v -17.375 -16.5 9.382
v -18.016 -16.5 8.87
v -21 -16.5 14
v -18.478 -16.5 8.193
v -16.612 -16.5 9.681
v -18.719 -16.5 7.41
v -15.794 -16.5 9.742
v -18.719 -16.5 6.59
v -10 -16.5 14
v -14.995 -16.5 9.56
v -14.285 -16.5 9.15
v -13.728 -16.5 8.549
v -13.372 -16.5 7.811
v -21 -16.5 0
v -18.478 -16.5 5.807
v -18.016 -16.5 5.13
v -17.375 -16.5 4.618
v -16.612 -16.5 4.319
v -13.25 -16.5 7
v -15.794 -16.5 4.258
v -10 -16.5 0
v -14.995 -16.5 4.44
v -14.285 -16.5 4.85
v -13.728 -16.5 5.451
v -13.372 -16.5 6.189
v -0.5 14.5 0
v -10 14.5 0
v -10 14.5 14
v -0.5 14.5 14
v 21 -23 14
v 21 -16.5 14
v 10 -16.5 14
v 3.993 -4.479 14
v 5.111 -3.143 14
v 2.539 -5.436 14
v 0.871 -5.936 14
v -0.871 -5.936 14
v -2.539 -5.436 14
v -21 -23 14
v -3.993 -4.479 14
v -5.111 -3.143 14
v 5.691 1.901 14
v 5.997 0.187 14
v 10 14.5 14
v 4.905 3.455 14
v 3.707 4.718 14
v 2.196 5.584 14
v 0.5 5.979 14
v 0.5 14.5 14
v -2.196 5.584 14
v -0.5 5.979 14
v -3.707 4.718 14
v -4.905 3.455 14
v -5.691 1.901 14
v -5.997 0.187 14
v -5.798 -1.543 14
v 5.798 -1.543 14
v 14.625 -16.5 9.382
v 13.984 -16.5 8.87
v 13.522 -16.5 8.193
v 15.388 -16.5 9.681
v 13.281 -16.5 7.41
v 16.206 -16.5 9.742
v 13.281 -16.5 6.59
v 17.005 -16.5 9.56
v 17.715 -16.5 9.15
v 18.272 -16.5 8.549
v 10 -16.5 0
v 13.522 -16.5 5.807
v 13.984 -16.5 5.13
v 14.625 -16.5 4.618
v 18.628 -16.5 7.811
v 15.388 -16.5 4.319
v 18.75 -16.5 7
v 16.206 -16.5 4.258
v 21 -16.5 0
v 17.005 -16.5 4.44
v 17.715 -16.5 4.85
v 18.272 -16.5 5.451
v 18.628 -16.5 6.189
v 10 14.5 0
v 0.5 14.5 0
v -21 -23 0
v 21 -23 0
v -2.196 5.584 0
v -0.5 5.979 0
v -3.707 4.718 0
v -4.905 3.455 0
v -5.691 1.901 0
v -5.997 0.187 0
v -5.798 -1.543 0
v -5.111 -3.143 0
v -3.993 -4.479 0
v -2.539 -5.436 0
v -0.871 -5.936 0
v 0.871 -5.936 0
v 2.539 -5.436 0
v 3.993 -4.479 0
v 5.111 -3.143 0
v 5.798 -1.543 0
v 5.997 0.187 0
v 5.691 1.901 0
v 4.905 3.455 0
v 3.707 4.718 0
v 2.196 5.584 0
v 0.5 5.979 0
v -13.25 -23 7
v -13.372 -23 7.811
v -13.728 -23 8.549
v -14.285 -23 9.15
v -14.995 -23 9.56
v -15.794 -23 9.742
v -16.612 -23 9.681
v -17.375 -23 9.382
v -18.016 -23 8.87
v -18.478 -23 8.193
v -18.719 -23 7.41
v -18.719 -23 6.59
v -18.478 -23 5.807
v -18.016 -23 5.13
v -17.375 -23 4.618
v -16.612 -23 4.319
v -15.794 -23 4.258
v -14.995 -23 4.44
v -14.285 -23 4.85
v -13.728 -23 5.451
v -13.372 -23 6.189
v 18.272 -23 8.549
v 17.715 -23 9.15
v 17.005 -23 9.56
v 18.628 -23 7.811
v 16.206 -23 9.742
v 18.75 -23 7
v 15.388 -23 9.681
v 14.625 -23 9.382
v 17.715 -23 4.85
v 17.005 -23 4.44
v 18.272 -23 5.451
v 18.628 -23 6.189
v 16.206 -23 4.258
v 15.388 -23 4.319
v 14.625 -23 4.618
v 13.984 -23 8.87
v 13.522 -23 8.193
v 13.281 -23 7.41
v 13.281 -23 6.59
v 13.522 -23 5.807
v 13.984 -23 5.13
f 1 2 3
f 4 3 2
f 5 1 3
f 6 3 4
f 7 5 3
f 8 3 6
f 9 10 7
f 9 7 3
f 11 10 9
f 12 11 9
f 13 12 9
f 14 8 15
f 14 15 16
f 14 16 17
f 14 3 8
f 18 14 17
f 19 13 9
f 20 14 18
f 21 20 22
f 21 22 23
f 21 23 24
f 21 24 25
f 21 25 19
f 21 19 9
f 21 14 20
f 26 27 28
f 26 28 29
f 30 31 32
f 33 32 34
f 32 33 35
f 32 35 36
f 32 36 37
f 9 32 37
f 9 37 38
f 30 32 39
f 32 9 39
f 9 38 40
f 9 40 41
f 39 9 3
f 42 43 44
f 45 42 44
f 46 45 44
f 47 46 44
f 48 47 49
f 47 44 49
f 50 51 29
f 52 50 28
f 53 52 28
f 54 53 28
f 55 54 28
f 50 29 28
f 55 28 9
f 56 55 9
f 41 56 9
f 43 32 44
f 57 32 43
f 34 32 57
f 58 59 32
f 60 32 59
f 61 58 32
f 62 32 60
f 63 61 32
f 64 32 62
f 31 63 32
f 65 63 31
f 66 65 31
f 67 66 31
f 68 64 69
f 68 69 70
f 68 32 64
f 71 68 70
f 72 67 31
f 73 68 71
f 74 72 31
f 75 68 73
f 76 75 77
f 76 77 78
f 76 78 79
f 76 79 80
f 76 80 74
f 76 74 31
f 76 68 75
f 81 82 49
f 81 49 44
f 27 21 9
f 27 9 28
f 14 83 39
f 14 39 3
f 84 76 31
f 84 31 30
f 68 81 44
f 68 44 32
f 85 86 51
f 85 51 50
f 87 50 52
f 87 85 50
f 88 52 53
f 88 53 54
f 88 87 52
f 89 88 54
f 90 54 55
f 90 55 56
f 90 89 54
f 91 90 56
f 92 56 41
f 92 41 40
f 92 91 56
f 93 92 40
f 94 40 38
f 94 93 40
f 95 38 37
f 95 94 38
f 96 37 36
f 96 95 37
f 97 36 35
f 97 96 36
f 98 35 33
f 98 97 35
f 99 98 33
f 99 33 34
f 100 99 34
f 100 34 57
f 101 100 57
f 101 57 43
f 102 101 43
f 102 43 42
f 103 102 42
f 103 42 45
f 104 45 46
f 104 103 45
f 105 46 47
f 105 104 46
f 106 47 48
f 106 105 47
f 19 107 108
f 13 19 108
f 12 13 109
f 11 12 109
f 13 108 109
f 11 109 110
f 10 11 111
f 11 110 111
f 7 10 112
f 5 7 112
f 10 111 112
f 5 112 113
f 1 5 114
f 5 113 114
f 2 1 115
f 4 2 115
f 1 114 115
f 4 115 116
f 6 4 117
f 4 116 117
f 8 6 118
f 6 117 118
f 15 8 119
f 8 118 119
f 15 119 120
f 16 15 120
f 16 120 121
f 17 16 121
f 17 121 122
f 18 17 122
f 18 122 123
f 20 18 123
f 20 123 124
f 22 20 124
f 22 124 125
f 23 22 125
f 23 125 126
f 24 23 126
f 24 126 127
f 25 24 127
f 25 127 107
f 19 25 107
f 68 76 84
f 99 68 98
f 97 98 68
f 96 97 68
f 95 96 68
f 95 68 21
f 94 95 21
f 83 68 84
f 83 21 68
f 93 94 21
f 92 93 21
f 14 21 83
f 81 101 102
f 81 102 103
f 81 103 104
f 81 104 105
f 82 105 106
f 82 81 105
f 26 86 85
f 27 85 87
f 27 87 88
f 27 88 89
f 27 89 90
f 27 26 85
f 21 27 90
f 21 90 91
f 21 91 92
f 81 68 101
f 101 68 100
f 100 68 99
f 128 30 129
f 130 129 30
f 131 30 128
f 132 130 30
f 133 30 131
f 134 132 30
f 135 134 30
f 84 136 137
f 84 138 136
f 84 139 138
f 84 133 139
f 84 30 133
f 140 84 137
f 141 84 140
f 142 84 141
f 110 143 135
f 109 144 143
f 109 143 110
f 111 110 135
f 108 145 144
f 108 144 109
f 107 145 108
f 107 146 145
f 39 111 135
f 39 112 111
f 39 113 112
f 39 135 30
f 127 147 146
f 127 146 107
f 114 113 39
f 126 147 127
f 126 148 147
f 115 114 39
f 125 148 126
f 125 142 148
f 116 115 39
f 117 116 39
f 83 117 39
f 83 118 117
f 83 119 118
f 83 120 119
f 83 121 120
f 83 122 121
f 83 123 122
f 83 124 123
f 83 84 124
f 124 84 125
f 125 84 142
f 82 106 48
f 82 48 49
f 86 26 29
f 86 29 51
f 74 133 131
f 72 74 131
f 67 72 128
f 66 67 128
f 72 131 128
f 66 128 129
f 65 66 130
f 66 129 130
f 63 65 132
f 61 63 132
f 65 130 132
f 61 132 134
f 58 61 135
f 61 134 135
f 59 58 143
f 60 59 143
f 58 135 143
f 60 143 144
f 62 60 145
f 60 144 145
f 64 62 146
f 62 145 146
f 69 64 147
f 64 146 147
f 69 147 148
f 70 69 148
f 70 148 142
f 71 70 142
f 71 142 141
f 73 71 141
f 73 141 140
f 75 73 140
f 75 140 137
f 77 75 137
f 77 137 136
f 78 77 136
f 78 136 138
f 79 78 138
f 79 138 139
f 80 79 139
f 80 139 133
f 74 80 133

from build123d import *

# Parameters (mm, degrees)
Y_KSEKLIK_EKSTR_ZYON2_DEPTH       = 14
KES_EKSTR_ZYON1_REACH             = 39.5
IZIM2_R                           = 2.75
KES_EKSTR_ZYON1_DIRECTION_2_DEPTH = 1


with BuildPart() as part:
    # Çizim1 → Yükseklik-Ekstrüzyon2 (new body)
    with BuildSketch(Plane.XY):
        with BuildLine():
            Line((21, -23), (-21, -23))
            Line((-21, -23), (-21, -16.5))
            Line((-21, -16.5), (-10, -16.5))
            Line((-10, -16.5), (-10, 14.5))
            Line((-10, 14.5), (-0.5, 14.5))
            Line((-0.5, 14.5), (-0.5, 5.979130372))
            ThreePointArc((-0.5, 5.979130372), (0, -6), (0.5, 5.979130372))
            Line((0.5, 5.979130372), (0.5, 14.5))
            Line((0.5, 14.5), (10, 14.5))
            Line((10, 14.5), (10, -16.5))
            Line((10, -16.5), (21, -16.5))
            Line((21, -16.5), (21, -23))
        make_face()
    extrude(amount=Y_KSEKLIK_EKSTR_ZYON2_DEPTH)

    # Çizim2 → Kes-Ekstrüzyon1 (cut, up to next)
    with BuildSketch(Plane.XZ.offset(23), mode=Mode.PRIVATE) as kes_ekstr_zyon1_sk1:
        with Locations((-16, 7)):
            Circle(IZIM2_R)
    kes_ekstr_zyon1_tool1 = extrude(kes_ekstr_zyon1_sk1.sketch, amount=-KES_EKSTR_ZYON1_REACH, mode=Mode.PRIVATE) & part.part
    add(kes_ekstr_zyon1_tool1.solids().sort_by_distance((-16, -23, 7))[0], mode=Mode.SUBTRACT)
    # Çizim2 → Kes-Ekstrüzyon1 (cut, up to next)
    with BuildSketch(Plane.XZ.offset(23), mode=Mode.PRIVATE) as kes_ekstr_zyon1_sk2:
        with Locations((16, 7)):
            Circle(IZIM2_R)
    kes_ekstr_zyon1_tool2 = extrude(kes_ekstr_zyon1_sk2.sketch, amount=-KES_EKSTR_ZYON1_REACH, mode=Mode.PRIVATE) & part.part
    add(kes_ekstr_zyon1_tool2.solids().sort_by_distance((16, -23, 7))[0], mode=Mode.SUBTRACT)

    # Çizim2 → Kes-Ekstrüzyon1 direction 2 (cut)
    with BuildSketch(Plane.XZ.offset(23)):
        with Locations((-16, 7)):
            Circle(IZIM2_R)
        with Locations((16, 7)):
            Circle(IZIM2_R)
    extrude(amount=KES_EKSTR_ZYON1_DIRECTION_2_DEPTH, mode=Mode.SUBTRACT)


solid = part.part
